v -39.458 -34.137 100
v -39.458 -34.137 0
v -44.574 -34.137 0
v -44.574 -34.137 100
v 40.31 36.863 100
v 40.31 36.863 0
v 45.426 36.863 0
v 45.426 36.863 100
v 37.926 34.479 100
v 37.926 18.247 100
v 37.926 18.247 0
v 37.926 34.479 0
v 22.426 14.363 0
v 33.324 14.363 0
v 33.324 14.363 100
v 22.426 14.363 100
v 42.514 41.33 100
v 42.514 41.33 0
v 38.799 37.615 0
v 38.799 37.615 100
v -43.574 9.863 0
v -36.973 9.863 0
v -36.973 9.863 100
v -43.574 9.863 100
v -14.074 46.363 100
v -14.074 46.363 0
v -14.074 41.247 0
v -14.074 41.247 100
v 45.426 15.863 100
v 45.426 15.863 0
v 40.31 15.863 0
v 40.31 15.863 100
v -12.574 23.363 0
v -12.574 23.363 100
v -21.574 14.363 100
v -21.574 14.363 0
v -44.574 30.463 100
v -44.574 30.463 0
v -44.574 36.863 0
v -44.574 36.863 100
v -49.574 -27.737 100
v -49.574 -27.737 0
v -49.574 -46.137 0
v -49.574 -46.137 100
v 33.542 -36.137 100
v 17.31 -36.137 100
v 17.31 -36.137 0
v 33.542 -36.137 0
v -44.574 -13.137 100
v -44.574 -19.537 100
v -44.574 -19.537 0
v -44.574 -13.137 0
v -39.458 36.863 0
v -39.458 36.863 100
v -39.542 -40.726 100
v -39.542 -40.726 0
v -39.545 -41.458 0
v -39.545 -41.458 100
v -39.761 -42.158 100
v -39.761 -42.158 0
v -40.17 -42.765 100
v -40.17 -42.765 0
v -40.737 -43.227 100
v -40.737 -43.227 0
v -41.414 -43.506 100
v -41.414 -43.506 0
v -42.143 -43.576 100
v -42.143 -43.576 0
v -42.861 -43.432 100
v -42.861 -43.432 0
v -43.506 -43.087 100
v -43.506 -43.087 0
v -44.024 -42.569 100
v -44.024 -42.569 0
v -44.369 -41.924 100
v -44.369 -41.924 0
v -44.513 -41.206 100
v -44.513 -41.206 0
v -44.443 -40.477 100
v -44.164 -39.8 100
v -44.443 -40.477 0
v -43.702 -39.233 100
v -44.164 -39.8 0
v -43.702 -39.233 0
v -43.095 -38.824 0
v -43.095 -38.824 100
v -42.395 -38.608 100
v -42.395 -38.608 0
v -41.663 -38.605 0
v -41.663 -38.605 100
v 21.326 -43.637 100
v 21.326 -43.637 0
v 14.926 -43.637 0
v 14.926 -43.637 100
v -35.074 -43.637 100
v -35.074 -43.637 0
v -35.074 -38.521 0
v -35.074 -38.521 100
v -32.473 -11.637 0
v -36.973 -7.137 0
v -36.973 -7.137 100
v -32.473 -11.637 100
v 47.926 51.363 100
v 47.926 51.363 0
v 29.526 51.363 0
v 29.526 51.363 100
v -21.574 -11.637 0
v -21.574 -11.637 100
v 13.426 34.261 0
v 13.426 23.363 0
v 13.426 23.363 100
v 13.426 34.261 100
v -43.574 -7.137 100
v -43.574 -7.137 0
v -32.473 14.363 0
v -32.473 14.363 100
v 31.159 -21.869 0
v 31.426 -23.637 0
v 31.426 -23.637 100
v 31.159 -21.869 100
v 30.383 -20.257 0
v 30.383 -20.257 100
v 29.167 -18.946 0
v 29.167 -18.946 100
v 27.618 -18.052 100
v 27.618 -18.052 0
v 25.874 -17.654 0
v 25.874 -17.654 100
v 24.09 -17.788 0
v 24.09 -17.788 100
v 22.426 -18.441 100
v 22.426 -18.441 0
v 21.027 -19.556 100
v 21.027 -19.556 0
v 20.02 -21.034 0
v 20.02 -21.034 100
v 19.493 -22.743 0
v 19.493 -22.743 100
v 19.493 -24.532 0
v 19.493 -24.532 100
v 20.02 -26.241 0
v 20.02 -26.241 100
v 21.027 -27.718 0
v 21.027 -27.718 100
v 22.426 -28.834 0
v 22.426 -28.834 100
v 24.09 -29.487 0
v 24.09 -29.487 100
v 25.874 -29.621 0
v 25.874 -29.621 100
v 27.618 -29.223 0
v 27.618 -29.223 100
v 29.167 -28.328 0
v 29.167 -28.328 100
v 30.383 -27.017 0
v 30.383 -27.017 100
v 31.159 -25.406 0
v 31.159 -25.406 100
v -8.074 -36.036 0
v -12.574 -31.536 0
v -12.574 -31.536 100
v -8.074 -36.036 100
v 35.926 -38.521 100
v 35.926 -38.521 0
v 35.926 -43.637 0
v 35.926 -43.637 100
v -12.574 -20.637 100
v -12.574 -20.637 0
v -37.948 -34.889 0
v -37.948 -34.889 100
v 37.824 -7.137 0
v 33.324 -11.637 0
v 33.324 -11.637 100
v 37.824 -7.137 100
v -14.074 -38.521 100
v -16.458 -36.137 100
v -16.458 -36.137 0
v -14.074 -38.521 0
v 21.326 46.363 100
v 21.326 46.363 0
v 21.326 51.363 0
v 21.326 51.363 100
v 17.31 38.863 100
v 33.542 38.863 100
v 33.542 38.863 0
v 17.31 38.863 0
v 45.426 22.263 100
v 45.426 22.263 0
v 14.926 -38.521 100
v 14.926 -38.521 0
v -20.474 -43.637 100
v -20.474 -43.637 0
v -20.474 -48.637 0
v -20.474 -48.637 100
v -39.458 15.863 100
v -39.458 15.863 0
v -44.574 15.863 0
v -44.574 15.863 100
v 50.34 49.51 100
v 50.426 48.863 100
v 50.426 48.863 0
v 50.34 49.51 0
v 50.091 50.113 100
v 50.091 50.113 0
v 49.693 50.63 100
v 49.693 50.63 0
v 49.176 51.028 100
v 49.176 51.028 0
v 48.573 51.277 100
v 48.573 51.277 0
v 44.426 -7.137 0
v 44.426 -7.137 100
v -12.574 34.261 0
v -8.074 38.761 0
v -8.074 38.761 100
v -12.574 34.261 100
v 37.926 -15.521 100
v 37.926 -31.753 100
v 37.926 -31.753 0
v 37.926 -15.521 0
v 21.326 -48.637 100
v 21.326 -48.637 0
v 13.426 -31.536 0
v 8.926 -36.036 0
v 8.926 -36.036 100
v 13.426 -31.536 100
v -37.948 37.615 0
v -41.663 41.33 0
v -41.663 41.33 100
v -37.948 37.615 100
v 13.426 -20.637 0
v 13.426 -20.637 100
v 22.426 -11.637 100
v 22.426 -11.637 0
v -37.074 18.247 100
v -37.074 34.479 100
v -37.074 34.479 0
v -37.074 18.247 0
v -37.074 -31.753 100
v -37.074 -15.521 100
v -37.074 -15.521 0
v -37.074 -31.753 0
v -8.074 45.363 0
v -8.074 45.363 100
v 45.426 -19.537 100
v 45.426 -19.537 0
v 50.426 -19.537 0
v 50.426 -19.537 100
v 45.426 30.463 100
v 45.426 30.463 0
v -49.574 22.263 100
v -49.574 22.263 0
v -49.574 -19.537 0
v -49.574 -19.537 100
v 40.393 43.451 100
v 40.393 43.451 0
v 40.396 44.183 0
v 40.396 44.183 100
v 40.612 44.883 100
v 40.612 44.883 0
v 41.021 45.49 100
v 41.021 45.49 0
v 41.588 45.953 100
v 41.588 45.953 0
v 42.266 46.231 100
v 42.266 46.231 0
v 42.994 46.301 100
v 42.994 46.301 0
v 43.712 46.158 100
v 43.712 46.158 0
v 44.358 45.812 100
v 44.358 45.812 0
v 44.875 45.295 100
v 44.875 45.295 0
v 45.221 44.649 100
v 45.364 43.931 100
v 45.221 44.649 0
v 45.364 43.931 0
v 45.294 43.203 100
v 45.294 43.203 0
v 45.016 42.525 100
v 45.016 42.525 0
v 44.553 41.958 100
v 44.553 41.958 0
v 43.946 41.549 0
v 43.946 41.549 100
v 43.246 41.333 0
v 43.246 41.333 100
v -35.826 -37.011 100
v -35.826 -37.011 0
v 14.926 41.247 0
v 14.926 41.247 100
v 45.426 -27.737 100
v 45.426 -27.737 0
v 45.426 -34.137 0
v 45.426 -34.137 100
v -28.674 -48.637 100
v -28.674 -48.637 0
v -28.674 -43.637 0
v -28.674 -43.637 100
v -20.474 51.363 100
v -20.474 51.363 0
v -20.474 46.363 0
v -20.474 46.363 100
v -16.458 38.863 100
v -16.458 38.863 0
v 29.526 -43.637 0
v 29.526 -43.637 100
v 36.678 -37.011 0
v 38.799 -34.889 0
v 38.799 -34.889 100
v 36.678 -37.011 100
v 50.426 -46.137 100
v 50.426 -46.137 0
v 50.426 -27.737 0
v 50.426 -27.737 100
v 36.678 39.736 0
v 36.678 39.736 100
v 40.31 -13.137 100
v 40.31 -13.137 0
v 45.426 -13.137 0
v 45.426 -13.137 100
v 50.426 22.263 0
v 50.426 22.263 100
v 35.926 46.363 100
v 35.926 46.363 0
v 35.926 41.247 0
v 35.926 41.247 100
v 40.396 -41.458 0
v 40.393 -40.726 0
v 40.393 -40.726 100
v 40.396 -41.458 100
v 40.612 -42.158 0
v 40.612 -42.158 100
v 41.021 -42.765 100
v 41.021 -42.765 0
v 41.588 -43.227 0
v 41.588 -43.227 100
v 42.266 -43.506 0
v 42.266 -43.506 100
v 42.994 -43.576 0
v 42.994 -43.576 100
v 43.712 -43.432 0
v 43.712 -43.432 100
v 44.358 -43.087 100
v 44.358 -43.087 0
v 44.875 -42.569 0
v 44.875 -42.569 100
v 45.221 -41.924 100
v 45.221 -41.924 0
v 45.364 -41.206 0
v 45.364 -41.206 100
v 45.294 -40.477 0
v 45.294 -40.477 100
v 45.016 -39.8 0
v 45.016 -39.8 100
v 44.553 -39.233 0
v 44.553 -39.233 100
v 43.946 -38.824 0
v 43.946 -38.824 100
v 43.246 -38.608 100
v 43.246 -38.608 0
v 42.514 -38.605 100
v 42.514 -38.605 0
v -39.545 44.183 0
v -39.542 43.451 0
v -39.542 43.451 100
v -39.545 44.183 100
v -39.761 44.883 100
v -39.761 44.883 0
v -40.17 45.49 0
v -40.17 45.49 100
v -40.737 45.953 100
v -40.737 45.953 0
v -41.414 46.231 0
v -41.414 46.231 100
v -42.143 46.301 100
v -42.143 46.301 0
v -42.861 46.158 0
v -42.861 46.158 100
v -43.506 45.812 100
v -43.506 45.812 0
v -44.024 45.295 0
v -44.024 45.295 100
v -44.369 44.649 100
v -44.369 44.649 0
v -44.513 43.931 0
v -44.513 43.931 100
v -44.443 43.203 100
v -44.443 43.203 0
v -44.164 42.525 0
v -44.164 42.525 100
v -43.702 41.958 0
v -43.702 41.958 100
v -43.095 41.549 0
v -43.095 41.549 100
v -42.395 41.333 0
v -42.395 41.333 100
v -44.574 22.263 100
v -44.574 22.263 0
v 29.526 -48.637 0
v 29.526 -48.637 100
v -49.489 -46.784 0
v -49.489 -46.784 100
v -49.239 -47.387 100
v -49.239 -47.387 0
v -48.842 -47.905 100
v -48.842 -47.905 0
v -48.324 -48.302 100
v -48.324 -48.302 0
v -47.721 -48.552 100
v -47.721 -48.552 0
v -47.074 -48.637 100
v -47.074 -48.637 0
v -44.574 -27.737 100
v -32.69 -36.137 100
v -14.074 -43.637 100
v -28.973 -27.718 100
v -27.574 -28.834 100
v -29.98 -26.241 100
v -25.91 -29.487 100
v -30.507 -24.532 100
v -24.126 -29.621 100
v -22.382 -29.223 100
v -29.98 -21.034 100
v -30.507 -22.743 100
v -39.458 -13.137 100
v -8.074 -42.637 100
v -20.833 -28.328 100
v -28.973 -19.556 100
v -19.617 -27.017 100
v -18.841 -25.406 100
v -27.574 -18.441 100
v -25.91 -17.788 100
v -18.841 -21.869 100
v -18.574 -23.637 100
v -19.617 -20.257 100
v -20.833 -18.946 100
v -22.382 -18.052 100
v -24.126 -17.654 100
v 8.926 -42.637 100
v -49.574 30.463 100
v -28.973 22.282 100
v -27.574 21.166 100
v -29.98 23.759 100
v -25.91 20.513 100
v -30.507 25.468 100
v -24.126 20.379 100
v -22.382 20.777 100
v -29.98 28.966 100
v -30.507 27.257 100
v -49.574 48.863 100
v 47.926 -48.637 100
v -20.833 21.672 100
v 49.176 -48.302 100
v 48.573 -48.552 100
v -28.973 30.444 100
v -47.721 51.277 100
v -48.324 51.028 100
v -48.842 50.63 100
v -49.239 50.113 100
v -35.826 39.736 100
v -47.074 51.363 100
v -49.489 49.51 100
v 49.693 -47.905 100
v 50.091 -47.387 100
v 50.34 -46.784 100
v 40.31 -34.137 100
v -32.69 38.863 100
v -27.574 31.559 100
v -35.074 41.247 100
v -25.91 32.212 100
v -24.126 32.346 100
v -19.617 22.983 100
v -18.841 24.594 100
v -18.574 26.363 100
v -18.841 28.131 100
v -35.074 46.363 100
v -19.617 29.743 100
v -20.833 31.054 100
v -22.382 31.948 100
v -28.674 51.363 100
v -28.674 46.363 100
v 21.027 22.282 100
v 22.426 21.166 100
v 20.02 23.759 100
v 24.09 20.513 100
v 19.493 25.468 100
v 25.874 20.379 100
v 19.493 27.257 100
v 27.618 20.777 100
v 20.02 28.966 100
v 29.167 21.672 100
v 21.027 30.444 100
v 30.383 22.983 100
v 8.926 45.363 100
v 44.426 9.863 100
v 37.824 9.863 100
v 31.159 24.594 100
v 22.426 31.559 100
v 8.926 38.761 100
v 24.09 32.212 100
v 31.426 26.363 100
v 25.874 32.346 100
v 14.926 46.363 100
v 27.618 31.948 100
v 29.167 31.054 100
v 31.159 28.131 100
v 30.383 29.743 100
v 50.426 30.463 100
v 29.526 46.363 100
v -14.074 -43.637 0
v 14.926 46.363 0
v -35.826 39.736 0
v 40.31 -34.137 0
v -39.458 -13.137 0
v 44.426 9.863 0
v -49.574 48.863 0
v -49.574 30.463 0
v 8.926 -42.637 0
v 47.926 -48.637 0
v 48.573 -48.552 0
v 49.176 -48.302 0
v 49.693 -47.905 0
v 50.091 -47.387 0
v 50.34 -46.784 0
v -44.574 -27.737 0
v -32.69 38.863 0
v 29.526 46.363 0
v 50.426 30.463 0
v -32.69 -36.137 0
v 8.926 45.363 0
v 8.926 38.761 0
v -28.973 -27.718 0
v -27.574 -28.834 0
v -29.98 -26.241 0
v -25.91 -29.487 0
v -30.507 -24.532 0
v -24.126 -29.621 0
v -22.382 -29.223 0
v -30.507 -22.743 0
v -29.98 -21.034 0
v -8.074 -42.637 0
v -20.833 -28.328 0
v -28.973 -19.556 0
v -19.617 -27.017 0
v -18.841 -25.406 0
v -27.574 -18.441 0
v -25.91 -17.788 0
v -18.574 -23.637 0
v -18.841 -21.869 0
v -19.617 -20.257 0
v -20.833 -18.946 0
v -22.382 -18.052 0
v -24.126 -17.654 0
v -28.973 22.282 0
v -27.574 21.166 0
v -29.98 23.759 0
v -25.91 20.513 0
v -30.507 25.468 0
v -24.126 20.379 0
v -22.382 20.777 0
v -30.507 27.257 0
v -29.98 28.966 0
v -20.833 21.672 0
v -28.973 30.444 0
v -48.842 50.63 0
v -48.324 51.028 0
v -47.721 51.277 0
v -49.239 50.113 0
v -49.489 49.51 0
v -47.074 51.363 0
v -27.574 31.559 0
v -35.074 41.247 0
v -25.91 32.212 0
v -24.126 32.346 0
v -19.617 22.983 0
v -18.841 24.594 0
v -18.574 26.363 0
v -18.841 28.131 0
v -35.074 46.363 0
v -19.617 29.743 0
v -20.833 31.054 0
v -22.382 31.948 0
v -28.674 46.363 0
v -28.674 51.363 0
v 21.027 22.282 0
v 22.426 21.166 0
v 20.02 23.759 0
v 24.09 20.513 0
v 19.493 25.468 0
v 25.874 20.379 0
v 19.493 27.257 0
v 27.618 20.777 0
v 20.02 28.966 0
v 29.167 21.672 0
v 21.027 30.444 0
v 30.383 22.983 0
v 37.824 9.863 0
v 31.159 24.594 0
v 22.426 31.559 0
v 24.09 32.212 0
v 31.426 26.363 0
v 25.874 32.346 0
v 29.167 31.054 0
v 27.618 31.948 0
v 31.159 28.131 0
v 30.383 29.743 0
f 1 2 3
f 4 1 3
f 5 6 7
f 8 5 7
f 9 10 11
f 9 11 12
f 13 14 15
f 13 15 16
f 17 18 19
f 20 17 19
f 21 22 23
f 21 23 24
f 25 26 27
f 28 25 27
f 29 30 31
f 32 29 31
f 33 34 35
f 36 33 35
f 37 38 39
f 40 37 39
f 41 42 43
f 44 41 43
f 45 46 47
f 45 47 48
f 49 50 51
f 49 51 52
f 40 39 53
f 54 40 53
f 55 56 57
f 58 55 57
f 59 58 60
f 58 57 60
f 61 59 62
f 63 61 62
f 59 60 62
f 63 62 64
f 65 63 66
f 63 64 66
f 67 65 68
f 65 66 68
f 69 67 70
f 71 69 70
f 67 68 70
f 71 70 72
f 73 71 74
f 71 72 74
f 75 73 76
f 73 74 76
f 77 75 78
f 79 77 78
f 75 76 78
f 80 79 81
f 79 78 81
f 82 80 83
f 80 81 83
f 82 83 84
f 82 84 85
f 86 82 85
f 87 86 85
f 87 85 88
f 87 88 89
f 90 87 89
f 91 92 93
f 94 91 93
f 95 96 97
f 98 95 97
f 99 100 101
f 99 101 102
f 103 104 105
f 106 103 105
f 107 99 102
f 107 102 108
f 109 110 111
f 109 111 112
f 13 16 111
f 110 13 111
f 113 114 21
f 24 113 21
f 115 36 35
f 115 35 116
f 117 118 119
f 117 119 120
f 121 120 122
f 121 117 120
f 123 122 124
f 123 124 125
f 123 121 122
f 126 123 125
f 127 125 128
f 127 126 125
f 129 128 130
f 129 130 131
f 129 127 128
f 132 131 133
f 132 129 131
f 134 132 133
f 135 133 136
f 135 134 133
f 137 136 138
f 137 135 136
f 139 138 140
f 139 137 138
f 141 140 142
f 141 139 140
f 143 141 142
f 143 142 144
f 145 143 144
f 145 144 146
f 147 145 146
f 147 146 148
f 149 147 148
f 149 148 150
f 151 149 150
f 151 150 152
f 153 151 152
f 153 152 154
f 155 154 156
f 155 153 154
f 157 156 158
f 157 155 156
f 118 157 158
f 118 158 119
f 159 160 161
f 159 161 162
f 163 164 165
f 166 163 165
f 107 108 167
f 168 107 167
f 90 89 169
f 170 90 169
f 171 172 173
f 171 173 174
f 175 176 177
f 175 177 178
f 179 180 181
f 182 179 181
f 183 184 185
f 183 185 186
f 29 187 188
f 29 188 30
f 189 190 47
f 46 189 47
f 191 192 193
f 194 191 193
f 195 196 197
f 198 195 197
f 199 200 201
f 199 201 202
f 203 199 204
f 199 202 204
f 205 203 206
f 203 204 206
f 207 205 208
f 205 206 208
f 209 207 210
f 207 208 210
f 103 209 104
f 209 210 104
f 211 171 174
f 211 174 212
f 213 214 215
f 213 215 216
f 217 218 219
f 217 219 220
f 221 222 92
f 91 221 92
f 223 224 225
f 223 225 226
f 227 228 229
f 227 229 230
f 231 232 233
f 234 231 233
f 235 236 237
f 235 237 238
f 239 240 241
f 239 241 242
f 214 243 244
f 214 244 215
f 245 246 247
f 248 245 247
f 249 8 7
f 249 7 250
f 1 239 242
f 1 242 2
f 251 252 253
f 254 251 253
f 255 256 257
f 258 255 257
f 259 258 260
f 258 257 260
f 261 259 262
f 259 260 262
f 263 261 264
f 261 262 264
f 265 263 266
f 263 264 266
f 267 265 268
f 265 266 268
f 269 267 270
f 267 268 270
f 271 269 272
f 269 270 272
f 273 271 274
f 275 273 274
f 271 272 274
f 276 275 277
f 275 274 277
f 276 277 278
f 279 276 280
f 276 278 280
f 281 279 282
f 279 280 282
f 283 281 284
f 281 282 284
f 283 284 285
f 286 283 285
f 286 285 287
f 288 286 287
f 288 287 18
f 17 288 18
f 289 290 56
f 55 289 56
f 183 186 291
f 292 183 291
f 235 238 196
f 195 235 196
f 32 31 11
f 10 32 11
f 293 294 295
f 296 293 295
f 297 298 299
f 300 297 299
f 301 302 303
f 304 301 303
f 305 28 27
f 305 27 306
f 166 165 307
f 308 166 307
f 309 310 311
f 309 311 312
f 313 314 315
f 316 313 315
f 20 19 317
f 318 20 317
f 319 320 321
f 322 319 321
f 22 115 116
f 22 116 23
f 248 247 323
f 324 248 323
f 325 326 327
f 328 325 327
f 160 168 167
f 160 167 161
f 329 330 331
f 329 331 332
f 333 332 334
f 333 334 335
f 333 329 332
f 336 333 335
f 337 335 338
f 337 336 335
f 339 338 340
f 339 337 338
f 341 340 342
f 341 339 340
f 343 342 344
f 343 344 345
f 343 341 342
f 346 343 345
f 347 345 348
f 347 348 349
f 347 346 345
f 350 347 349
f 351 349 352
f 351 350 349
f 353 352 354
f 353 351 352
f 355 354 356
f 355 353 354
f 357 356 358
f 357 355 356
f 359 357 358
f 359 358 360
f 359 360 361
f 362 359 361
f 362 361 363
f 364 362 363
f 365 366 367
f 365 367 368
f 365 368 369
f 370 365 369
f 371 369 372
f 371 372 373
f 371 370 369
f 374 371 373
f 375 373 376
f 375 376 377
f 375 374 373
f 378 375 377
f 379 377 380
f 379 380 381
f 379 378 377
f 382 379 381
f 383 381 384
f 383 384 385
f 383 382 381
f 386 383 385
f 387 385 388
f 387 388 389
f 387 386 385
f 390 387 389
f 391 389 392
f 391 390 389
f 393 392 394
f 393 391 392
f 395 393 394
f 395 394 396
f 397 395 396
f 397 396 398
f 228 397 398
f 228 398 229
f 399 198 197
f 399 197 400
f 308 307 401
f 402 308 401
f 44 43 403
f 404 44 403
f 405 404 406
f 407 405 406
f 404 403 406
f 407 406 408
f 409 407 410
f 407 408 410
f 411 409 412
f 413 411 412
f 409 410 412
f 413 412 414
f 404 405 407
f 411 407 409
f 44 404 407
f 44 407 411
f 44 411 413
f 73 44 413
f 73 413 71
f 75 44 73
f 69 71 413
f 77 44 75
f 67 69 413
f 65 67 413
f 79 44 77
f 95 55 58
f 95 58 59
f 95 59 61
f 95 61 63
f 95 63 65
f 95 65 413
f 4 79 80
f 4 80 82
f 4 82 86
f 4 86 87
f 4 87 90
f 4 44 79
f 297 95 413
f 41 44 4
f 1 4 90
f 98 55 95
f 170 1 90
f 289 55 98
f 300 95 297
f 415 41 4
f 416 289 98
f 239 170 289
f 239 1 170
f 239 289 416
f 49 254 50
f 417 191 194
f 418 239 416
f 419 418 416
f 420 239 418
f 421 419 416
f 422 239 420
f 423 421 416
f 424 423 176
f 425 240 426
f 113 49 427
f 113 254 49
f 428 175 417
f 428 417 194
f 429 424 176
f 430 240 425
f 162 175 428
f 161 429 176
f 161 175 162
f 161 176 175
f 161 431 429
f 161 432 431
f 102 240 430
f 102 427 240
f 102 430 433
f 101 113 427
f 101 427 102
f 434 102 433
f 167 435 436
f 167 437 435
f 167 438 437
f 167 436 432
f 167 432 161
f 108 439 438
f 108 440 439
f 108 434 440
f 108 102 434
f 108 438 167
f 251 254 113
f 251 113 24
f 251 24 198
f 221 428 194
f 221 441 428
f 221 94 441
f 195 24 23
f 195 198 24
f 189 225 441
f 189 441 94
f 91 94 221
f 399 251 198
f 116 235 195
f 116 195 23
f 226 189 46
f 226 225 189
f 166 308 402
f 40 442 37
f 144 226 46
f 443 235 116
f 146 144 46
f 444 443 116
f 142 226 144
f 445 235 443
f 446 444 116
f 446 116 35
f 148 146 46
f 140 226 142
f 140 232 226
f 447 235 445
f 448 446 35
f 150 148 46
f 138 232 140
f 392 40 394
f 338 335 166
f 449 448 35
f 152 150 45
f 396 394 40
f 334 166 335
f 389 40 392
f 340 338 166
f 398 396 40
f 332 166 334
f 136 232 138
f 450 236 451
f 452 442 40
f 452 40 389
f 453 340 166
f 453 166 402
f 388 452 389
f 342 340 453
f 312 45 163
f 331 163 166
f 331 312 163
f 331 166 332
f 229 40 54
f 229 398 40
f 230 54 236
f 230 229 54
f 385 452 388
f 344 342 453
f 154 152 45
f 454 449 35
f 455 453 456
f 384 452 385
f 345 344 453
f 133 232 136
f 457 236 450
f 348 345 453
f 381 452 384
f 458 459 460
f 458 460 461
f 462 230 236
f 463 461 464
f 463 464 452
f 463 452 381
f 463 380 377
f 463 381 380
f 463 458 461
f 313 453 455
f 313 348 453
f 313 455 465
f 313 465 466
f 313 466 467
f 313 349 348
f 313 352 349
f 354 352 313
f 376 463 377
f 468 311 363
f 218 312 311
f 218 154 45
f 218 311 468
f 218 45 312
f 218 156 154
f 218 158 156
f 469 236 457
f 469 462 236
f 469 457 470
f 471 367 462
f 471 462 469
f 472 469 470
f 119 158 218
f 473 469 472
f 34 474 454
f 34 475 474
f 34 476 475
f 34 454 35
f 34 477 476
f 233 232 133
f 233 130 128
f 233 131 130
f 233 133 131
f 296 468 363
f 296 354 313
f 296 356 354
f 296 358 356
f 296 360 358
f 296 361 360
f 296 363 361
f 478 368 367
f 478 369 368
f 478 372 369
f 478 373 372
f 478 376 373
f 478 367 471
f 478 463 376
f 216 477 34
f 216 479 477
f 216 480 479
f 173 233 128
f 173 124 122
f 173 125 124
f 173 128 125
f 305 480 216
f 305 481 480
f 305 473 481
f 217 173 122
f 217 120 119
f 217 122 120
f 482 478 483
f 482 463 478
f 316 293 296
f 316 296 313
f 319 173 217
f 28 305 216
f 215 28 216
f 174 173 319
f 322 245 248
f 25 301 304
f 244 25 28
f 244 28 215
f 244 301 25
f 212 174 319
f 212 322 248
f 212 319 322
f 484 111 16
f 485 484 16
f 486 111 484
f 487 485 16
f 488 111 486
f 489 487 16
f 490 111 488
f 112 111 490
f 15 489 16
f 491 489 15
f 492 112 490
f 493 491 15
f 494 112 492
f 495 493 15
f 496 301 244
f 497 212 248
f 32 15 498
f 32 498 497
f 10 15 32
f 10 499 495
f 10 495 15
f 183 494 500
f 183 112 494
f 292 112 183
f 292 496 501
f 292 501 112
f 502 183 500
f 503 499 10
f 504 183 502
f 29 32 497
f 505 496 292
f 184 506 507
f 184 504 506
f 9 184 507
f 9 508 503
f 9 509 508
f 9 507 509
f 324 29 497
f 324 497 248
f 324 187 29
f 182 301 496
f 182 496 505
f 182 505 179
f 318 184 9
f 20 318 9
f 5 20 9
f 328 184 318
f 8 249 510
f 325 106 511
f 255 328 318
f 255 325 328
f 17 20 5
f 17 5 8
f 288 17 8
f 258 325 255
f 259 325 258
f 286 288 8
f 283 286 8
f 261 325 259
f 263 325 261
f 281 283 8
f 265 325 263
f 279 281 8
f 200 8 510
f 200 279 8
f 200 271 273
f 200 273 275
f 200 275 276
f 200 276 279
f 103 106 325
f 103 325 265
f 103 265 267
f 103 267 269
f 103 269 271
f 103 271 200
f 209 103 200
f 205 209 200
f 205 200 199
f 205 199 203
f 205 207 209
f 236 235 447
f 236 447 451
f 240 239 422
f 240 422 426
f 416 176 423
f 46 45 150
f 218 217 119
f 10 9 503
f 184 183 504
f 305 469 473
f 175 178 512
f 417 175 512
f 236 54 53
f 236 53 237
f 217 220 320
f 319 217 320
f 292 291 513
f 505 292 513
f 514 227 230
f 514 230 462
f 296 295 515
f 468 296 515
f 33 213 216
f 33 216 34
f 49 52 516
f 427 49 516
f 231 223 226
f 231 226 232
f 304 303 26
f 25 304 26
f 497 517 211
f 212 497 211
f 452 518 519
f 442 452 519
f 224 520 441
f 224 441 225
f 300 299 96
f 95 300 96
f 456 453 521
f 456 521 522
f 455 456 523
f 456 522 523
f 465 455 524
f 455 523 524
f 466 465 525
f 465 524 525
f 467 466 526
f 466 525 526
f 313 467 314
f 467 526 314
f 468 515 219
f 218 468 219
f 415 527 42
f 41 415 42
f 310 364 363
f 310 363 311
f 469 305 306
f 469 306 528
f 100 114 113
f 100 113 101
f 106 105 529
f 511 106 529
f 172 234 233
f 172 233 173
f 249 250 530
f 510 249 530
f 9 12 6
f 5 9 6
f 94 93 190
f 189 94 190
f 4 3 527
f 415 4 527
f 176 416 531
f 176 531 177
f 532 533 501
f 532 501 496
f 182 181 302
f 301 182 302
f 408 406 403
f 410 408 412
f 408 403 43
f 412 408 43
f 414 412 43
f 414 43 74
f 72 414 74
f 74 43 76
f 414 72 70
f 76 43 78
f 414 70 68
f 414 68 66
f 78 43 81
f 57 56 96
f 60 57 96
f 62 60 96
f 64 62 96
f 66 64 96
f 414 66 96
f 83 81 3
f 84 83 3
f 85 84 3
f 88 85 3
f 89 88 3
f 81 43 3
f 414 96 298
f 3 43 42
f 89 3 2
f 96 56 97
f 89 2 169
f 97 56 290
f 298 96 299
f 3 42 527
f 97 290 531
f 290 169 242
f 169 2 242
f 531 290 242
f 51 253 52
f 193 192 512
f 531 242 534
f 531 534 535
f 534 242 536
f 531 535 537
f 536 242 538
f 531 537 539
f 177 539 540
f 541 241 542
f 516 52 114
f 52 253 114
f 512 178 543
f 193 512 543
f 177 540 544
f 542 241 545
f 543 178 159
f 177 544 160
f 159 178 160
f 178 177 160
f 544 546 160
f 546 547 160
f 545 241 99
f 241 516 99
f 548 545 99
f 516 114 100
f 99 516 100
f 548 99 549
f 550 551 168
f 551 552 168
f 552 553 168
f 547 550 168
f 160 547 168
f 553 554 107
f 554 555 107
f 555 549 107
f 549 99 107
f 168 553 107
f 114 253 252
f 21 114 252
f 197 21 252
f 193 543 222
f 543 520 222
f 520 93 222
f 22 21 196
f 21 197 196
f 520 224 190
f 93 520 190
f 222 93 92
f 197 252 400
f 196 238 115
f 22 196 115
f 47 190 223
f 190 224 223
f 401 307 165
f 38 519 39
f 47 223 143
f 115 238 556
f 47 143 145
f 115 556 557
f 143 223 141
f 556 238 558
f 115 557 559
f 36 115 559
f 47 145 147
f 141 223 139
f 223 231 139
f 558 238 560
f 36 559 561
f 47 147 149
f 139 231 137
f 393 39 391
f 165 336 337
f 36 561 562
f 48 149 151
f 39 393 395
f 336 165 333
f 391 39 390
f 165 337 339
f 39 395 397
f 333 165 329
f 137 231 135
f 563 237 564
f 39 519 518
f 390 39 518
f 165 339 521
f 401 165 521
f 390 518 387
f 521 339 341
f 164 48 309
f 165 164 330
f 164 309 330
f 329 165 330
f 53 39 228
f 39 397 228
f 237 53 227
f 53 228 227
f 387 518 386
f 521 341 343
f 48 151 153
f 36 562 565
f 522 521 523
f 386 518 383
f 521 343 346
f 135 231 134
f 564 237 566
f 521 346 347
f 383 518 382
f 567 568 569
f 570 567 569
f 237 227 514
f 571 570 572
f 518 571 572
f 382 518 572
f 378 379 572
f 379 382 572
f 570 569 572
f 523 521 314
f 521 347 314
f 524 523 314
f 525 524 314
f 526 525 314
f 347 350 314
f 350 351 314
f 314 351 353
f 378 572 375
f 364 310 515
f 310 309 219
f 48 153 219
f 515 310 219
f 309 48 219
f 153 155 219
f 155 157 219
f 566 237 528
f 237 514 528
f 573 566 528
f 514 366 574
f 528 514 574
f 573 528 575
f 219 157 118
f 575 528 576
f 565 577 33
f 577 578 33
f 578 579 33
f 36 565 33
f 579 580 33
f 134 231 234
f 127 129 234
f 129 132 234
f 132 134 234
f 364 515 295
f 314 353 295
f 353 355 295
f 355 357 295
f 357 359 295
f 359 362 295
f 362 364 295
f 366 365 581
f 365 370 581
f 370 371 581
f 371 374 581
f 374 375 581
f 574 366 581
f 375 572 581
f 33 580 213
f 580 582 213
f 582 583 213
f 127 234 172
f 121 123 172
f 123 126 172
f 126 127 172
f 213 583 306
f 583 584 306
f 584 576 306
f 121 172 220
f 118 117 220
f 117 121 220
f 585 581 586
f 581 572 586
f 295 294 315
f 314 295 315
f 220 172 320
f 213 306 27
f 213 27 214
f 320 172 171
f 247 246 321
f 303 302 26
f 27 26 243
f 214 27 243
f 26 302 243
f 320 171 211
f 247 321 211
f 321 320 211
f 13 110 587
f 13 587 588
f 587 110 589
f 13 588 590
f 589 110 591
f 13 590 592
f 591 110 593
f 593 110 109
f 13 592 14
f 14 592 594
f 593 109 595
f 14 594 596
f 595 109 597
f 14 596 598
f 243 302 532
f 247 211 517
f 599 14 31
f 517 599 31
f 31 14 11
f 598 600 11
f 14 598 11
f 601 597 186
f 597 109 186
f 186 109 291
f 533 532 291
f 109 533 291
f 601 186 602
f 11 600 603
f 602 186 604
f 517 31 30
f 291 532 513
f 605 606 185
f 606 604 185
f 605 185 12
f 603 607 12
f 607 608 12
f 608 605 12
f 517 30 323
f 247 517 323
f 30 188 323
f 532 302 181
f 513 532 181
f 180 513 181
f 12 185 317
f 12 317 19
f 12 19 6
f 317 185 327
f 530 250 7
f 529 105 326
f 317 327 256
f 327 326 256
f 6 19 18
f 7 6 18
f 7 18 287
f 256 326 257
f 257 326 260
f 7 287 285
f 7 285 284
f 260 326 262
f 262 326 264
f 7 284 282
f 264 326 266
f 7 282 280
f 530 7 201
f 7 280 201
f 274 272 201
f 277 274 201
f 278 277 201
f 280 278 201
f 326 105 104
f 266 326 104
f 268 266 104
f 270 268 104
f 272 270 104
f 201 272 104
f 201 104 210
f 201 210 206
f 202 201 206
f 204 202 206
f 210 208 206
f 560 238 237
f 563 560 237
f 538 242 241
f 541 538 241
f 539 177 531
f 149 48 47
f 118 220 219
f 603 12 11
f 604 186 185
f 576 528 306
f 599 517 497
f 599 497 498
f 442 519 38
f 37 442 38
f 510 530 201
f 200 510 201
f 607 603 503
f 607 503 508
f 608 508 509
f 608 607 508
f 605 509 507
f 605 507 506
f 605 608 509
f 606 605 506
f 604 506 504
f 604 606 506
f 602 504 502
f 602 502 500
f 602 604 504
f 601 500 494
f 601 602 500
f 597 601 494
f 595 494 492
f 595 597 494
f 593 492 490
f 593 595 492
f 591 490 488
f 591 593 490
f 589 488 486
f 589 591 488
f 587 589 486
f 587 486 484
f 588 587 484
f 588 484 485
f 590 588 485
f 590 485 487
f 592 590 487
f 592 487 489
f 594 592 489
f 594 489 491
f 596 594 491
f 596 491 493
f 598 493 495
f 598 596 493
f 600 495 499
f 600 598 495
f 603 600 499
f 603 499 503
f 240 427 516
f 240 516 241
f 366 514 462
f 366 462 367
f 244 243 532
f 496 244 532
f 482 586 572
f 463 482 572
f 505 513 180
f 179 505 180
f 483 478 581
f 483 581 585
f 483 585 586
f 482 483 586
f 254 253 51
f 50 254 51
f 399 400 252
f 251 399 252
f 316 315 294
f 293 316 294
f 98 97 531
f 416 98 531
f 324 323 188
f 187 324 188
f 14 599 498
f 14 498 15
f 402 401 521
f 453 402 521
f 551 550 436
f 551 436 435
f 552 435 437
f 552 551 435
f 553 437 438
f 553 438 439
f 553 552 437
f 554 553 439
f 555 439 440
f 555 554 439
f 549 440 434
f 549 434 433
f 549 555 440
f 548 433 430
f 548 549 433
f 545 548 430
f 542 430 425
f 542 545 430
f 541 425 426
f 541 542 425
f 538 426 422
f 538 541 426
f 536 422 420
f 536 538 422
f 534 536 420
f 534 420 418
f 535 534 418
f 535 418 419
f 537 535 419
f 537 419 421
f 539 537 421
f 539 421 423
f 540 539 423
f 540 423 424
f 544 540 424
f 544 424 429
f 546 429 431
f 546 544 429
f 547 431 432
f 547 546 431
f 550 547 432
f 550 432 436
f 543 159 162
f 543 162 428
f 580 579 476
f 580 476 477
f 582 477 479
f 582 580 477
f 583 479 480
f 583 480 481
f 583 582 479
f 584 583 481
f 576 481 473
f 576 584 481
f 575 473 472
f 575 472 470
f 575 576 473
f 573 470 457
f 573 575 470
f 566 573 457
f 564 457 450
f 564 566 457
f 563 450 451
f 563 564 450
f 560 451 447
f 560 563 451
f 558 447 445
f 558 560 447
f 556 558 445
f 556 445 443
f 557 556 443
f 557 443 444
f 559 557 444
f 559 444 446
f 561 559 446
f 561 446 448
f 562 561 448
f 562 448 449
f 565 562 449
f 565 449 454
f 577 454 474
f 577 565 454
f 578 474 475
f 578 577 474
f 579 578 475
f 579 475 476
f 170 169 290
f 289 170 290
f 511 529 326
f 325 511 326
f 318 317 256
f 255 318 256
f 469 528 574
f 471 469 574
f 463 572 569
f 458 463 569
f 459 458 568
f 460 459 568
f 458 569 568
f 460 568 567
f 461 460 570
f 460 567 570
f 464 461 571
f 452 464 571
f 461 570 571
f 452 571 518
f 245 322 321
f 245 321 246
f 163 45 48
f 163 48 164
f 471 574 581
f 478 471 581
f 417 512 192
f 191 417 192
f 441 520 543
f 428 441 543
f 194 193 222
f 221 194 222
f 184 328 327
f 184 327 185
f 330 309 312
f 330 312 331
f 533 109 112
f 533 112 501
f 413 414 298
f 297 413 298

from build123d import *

# Parameters (mm, degrees)
SKETCH_1_R      = 6
EXTRUDE_1_DEPTH = 100


with BuildPart() as part:
    # 草图1 → 凸台-拉伸1 (new body)
    with BuildSketch(Plane.XY):
        with BuildLine():
            Line((-28.674392903, 51.362622721), (-47.074392903, 51.362622721))
            ThreePointArc((-47.074392903, 51.362622721), (-48.842159856, 50.630389674), (-49.574392903, 48.862622721))
            Line((-49.574392903, 48.862622721), (-49.574392903, 30.462622721))
            Line((-49.574392903, 30.462622721), (-44.574392903, 30.462622721))
            Line((-44.574392903, 30.462622721), (-44.574392903, 36.862622721))
            Line((-44.574392903, 36.862622721), (-39.458454947, 36.862622721))
            Line((-39.458454947, 36.862622721), (-37.074392903, 34.478560678))
            Line((-37.074392903, 34.478560678), (-37.074392903, 26.362622721))
            Line((-37.074392903, 26.362622721), (-37.074392903, 18.246684764))
            Line((-37.074392903, 18.246684764), (-39.458454947, 15.862622721))
            Line((-39.458454947, 15.862622721), (-44.574392903, 15.862622721))
            Line((-44.574392903, 15.862622721), (-44.574392903, 22.262622721))
            Line((-44.574392903, 22.262622721), (-49.574392903, 22.262622721))
            Line((-49.574392903, 22.262622721), (-49.574392903, 1.362622721))
            Line((-49.574392903, 1.362622721), (-49.574392903, -19.537377279))
            Line((-49.574392903, -19.537377279), (-44.574392903, -19.537377279))
            Line((-44.574392903, -19.537377279), (-44.574392903, -13.137377279))
            Line((-44.574392903, -13.137377279), (-39.458454947, -13.137377279))
            Line((-39.458454947, -13.137377279), (-37.074392903, -15.521439322))
            Line((-37.074392903, -15.521439322), (-37.074392903, -23.637377279))
            Line((-37.074392903, -23.637377279), (-37.074392903, -31.753315236))
            Line((-37.074392903, -31.753315236), (-39.458454947, -34.137377279))
            Line((-39.458454947, -34.137377279), (-44.574392903, -34.137377279))
            Line((-44.574392903, -34.137377279), (-44.574392903, -27.737377279))
            Line((-44.574392903, -27.737377279), (-49.574392903, -27.737377279))
            Line((-49.574392903, -27.737377279), (-49.574392903, -46.137377279))
            ThreePointArc((-49.574392903, -46.137377279), (-48.842159856, -47.905144232), (-47.074392903, -48.637377279))
            Line((-47.074392903, -48.637377279), (-28.674392903, -48.637377279))
            Line((-28.674392903, -48.637377279), (-28.674392903, -43.637377279))
            Line((-28.674392903, -43.637377279), (-35.074392903, -43.637377279))
            Line((-35.074392903, -43.637377279), (-35.074392903, -38.521439322))
            Line((-35.074392903, -38.521439322), (-32.69033086, -36.137377279))
            Line((-32.69033086, -36.137377279), (-24.574392903, -36.137377279))
            Line((-24.574392903, -36.137377279), (-16.458454947, -36.137377279))
            Line((-16.458454947, -36.137377279), (-14.074392903, -38.521439322))
            Line((-14.074392903, -38.521439322), (-14.074392903, -43.637377279))
            Line((-14.074392903, -43.637377279), (-20.474392903, -43.637377279))
            Line((-20.474392903, -43.637377279), (-20.474392903, -48.637377279))
            Line((-20.474392903, -48.637377279), (0.425607097, -48.637377279))
            Line((0.425607097, -48.637377279), (21.325607097, -48.637377279))
            Line((21.325607097, -48.637377279), (21.325607097, -43.637377279))
            Line((21.325607097, -43.637377279), (14.925607097, -43.637377279))
            Line((14.925607097, -43.637377279), (14.925607097, -38.521439322))
            Line((14.925607097, -38.521439322), (17.30966914, -36.137377279))
            Line((17.30966914, -36.137377279), (25.425607097, -36.137377279))
            Line((25.425607097, -36.137377279), (33.541545053, -36.137377279))
            Line((33.541545053, -36.137377279), (35.925607097, -38.521439322))
            Line((35.925607097, -38.521439322), (35.925607097, -43.637377279))
            Line((35.925607097, -43.637377279), (29.525607097, -43.637377279))
            Line((29.525607097, -43.637377279), (29.525607097, -48.637377279))
            Line((29.525607097, -48.637377279), (47.925607097, -48.637377279))
            ThreePointArc((47.925607097, -48.637377279), (49.69337405, -47.905144232), (50.425607097, -46.137377279))
            Line((50.425607097, -46.137377279), (50.425607097, -27.737377279))
            Line((50.425607097, -27.737377279), (45.425607097, -27.737377279))
            Line((45.425607097, -27.737377279), (45.425607097, -34.137377279))
            Line((45.425607097, -34.137377279), (40.30966914, -34.137377279))
            Line((40.30966914, -34.137377279), (37.925607097, -31.753315236))
            Line((37.925607097, -31.753315236), (37.925607097, -23.637377279))
            Line((37.925607097, -23.637377279), (37.925607097, -15.521439322))
            Line((37.925607097, -15.521439322), (40.30966914, -13.137377279))
            Line((40.30966914, -13.137377279), (45.425607097, -13.137377279))
            Line((45.425607097, -13.137377279), (45.425607097, -19.537377279))
            Line((45.425607097, -19.537377279), (50.425607097, -19.537377279))
            Line((50.425607097, -19.537377279), (50.425607097, 1.362622721))
            Line((50.425607097, 1.362622721), (50.425607097, 22.262622721))
            Line((50.425607097, 22.262622721), (45.425607097, 22.262622721))
            Line((45.425607097, 22.262622721), (45.425607097, 15.862622721))
            Line((45.425607097, 15.862622721), (40.30966914, 15.862622721))
            Line((40.30966914, 15.862622721), (37.925607097, 18.246684764))
            Line((37.925607097, 18.246684764), (37.925607097, 26.362622721))
            Line((37.925607097, 26.362622721), (37.925607097, 34.478560678))
            Line((37.925607097, 34.478560678), (40.30966914, 36.862622721))
            Line((40.30966914, 36.862622721), (45.425607097, 36.862622721))
            Line((45.425607097, 36.862622721), (45.425607097, 30.462622721))
            Line((45.425607097, 30.462622721), (50.425607097, 30.462622721))
            Line((50.425607097, 30.462622721), (50.425607097, 48.862622721))
            ThreePointArc((50.425607097, 48.862622721), (49.69337405, 50.630389674), (47.925607097, 51.362622721))
            Line((47.925607097, 51.362622721), (29.525607097, 51.362622721))
            Line((29.525607097, 51.362622721), (29.525607097, 46.362622721))
            Line((29.525607097, 46.362622721), (35.925607097, 46.362622721))
            Line((35.925607097, 46.362622721), (35.925607097, 41.246684764))
            Line((35.925607097, 41.246684764), (33.541545053, 38.862622721))
            Line((33.541545053, 38.862622721), (25.425607097, 38.862622721))
            Line((25.425607097, 38.862622721), (17.30966914, 38.862622721))
            Line((17.30966914, 38.862622721), (14.925607097, 41.246684764))
            Line((14.925607097, 41.246684764), (14.925607097, 46.362622721))
            Line((14.925607097, 46.362622721), (21.325607097, 46.362622721))
            Line((21.325607097, 46.362622721), (21.325607097, 51.362622721))
            Line((21.325607097, 51.362622721), (0.425607097, 51.362622721))
            Line((0.425607097, 51.362622721), (-20.474392903, 51.362622721))
            Line((-20.474392903, 51.362622721), (-20.474392903, 46.362622721))
            Line((-20.474392903, 46.362622721), (-14.074392903, 46.362622721))
            Line((-14.074392903, 46.362622721), (-14.074392903, 41.246684764))
            Line((-14.074392903, 41.246684764), (-16.458454947, 38.862622721))
            Line((-16.458454947, 38.862622721), (-24.574392903, 38.862622721))
            Line((-24.574392903, 38.862622721), (-32.69033086, 38.862622721))
            Line((-32.69033086, 38.862622721), (-35.074392903, 41.246684764))
            Line((-35.074392903, 41.246684764), (-35.074392903, 46.362622721))
            Line((-35.074392903, 46.362622721), (-28.674392903, 46.362622721))
            Line((-28.674392903, 46.362622721), (-28.674392903, 51.362622721))
        make_face()
        with Locations((-24.574392903, 26.362622721)):
            Circle(SKETCH_1_R, mode=Mode.SUBTRACT)
        with Locations((25.425607097, 26.362622721)):
            Circle(SKETCH_1_R, mode=Mode.SUBTRACT)
        with Locations((-24.574392903, -23.637377279)):
            Circle(SKETCH_1_R, mode=Mode.SUBTRACT)
        with Locations((25.425607097, -23.637377279)):
            Circle(SKETCH_1_R, mode=Mode.SUBTRACT)
        with BuildLine():
            Line((-35.826372672, 39.735922833), (-39.541550191, 43.451100352))
            ThreePointArc((-39.541550191, 43.451100352), (-43.784190878, 45.572420696), (-41.662870534, 41.329780008))
            Line((-41.662870534, 41.329780008), (-37.947693016, 37.61460249))
            Line((-37.947693016, 37.61460249), (-35.826372672, 39.735922833))
        make_face(mode=Mode.SUBTRACT)
        Polygon((-8.074392903, 45.362622721), (-8.074392903, 38.76140339), (-12.574392903, 34.26140339), (-12.574392903, 23.362622721), (-21.574392903, 14.362622721), (-32.473173572, 14.362622721), (-36.973173572, 9.862622721), (-43.574392903, 9.862622721), (-43.574392903, 1.362622721), (-43.574392903, -7.137377279), (-36.973173572, -7.137377279), (-32.473173572, -11.637377279), (-21.574392903, -11.637377279), (-12.574392903, -20.637377279), (-12.574392903, -31.536157948), (-8.074392903, -36.036157948), (-8.074392903, -42.637377279), (0.425607097, -42.637377279), (8.925607097, -42.637377279), (8.925607097, -36.036157948), (13.425607097, -31.536157948), (13.425607097, -20.637377279), (22.425607097, -11.637377279), (33.324387766, -11.637377279), (37.824387766, -7.137377279), (44.425607097, -7.137377279), (44.425607097, 1.362622721), (44.425607097, 9.862622721), (37.824387766, 9.862622721), (33.324387766, 14.362622721), (22.425607097, 14.362622721), (13.425607097, 23.362622721), (13.425607097, 34.26140339), (8.925607097, 38.76140339), (8.925607097, 45.362622721), (0.425607097, 45.362622721), align=None, mode=Mode.SUBTRACT)
        with BuildLine():
            Line((36.677586865, 39.735922833), (40.392764384, 43.451100352))
            ThreePointArc((40.392764384, 43.451100352), (44.635405071, 45.572420696), (42.514084728, 41.329780008))
            Line((42.514084728, 41.329780008), (38.798907209, 37.61460249))
            Line((38.798907209, 37.61460249), (36.677586865, 39.735922833))
        make_face(mode=Mode.SUBTRACT)
        with BuildLine():
            Line((-35.826372672, -37.010677391), (-39.541550191, -40.72585491))
            ThreePointArc((-39.541550191, -40.72585491), (-43.784190878, -42.847175254), (-41.662870534, -38.604534567))
            Line((-41.662870534, -38.604534567), (-37.947693016, -34.889357048))
            Line((-37.947693016, -34.889357048), (-35.826372672, -37.010677391))
        make_face(mode=Mode.SUBTRACT)
        with BuildLine():
            Line((36.677586865, -37.010677391), (40.392764384, -40.72585491))
            ThreePointArc((40.392764384, -40.72585491), (44.635405071, -42.847175254), (42.514084728, -38.604534567))
            Line((42.514084728, -38.604534567), (38.798907209, -34.889357048))
            Line((38.798907209, -34.889357048), (36.677586865, -37.010677391))
        make_face(mode=Mode.SUBTRACT)
    extrude(amount=EXTRUDE_1_DEPTH)


solid = part.part
